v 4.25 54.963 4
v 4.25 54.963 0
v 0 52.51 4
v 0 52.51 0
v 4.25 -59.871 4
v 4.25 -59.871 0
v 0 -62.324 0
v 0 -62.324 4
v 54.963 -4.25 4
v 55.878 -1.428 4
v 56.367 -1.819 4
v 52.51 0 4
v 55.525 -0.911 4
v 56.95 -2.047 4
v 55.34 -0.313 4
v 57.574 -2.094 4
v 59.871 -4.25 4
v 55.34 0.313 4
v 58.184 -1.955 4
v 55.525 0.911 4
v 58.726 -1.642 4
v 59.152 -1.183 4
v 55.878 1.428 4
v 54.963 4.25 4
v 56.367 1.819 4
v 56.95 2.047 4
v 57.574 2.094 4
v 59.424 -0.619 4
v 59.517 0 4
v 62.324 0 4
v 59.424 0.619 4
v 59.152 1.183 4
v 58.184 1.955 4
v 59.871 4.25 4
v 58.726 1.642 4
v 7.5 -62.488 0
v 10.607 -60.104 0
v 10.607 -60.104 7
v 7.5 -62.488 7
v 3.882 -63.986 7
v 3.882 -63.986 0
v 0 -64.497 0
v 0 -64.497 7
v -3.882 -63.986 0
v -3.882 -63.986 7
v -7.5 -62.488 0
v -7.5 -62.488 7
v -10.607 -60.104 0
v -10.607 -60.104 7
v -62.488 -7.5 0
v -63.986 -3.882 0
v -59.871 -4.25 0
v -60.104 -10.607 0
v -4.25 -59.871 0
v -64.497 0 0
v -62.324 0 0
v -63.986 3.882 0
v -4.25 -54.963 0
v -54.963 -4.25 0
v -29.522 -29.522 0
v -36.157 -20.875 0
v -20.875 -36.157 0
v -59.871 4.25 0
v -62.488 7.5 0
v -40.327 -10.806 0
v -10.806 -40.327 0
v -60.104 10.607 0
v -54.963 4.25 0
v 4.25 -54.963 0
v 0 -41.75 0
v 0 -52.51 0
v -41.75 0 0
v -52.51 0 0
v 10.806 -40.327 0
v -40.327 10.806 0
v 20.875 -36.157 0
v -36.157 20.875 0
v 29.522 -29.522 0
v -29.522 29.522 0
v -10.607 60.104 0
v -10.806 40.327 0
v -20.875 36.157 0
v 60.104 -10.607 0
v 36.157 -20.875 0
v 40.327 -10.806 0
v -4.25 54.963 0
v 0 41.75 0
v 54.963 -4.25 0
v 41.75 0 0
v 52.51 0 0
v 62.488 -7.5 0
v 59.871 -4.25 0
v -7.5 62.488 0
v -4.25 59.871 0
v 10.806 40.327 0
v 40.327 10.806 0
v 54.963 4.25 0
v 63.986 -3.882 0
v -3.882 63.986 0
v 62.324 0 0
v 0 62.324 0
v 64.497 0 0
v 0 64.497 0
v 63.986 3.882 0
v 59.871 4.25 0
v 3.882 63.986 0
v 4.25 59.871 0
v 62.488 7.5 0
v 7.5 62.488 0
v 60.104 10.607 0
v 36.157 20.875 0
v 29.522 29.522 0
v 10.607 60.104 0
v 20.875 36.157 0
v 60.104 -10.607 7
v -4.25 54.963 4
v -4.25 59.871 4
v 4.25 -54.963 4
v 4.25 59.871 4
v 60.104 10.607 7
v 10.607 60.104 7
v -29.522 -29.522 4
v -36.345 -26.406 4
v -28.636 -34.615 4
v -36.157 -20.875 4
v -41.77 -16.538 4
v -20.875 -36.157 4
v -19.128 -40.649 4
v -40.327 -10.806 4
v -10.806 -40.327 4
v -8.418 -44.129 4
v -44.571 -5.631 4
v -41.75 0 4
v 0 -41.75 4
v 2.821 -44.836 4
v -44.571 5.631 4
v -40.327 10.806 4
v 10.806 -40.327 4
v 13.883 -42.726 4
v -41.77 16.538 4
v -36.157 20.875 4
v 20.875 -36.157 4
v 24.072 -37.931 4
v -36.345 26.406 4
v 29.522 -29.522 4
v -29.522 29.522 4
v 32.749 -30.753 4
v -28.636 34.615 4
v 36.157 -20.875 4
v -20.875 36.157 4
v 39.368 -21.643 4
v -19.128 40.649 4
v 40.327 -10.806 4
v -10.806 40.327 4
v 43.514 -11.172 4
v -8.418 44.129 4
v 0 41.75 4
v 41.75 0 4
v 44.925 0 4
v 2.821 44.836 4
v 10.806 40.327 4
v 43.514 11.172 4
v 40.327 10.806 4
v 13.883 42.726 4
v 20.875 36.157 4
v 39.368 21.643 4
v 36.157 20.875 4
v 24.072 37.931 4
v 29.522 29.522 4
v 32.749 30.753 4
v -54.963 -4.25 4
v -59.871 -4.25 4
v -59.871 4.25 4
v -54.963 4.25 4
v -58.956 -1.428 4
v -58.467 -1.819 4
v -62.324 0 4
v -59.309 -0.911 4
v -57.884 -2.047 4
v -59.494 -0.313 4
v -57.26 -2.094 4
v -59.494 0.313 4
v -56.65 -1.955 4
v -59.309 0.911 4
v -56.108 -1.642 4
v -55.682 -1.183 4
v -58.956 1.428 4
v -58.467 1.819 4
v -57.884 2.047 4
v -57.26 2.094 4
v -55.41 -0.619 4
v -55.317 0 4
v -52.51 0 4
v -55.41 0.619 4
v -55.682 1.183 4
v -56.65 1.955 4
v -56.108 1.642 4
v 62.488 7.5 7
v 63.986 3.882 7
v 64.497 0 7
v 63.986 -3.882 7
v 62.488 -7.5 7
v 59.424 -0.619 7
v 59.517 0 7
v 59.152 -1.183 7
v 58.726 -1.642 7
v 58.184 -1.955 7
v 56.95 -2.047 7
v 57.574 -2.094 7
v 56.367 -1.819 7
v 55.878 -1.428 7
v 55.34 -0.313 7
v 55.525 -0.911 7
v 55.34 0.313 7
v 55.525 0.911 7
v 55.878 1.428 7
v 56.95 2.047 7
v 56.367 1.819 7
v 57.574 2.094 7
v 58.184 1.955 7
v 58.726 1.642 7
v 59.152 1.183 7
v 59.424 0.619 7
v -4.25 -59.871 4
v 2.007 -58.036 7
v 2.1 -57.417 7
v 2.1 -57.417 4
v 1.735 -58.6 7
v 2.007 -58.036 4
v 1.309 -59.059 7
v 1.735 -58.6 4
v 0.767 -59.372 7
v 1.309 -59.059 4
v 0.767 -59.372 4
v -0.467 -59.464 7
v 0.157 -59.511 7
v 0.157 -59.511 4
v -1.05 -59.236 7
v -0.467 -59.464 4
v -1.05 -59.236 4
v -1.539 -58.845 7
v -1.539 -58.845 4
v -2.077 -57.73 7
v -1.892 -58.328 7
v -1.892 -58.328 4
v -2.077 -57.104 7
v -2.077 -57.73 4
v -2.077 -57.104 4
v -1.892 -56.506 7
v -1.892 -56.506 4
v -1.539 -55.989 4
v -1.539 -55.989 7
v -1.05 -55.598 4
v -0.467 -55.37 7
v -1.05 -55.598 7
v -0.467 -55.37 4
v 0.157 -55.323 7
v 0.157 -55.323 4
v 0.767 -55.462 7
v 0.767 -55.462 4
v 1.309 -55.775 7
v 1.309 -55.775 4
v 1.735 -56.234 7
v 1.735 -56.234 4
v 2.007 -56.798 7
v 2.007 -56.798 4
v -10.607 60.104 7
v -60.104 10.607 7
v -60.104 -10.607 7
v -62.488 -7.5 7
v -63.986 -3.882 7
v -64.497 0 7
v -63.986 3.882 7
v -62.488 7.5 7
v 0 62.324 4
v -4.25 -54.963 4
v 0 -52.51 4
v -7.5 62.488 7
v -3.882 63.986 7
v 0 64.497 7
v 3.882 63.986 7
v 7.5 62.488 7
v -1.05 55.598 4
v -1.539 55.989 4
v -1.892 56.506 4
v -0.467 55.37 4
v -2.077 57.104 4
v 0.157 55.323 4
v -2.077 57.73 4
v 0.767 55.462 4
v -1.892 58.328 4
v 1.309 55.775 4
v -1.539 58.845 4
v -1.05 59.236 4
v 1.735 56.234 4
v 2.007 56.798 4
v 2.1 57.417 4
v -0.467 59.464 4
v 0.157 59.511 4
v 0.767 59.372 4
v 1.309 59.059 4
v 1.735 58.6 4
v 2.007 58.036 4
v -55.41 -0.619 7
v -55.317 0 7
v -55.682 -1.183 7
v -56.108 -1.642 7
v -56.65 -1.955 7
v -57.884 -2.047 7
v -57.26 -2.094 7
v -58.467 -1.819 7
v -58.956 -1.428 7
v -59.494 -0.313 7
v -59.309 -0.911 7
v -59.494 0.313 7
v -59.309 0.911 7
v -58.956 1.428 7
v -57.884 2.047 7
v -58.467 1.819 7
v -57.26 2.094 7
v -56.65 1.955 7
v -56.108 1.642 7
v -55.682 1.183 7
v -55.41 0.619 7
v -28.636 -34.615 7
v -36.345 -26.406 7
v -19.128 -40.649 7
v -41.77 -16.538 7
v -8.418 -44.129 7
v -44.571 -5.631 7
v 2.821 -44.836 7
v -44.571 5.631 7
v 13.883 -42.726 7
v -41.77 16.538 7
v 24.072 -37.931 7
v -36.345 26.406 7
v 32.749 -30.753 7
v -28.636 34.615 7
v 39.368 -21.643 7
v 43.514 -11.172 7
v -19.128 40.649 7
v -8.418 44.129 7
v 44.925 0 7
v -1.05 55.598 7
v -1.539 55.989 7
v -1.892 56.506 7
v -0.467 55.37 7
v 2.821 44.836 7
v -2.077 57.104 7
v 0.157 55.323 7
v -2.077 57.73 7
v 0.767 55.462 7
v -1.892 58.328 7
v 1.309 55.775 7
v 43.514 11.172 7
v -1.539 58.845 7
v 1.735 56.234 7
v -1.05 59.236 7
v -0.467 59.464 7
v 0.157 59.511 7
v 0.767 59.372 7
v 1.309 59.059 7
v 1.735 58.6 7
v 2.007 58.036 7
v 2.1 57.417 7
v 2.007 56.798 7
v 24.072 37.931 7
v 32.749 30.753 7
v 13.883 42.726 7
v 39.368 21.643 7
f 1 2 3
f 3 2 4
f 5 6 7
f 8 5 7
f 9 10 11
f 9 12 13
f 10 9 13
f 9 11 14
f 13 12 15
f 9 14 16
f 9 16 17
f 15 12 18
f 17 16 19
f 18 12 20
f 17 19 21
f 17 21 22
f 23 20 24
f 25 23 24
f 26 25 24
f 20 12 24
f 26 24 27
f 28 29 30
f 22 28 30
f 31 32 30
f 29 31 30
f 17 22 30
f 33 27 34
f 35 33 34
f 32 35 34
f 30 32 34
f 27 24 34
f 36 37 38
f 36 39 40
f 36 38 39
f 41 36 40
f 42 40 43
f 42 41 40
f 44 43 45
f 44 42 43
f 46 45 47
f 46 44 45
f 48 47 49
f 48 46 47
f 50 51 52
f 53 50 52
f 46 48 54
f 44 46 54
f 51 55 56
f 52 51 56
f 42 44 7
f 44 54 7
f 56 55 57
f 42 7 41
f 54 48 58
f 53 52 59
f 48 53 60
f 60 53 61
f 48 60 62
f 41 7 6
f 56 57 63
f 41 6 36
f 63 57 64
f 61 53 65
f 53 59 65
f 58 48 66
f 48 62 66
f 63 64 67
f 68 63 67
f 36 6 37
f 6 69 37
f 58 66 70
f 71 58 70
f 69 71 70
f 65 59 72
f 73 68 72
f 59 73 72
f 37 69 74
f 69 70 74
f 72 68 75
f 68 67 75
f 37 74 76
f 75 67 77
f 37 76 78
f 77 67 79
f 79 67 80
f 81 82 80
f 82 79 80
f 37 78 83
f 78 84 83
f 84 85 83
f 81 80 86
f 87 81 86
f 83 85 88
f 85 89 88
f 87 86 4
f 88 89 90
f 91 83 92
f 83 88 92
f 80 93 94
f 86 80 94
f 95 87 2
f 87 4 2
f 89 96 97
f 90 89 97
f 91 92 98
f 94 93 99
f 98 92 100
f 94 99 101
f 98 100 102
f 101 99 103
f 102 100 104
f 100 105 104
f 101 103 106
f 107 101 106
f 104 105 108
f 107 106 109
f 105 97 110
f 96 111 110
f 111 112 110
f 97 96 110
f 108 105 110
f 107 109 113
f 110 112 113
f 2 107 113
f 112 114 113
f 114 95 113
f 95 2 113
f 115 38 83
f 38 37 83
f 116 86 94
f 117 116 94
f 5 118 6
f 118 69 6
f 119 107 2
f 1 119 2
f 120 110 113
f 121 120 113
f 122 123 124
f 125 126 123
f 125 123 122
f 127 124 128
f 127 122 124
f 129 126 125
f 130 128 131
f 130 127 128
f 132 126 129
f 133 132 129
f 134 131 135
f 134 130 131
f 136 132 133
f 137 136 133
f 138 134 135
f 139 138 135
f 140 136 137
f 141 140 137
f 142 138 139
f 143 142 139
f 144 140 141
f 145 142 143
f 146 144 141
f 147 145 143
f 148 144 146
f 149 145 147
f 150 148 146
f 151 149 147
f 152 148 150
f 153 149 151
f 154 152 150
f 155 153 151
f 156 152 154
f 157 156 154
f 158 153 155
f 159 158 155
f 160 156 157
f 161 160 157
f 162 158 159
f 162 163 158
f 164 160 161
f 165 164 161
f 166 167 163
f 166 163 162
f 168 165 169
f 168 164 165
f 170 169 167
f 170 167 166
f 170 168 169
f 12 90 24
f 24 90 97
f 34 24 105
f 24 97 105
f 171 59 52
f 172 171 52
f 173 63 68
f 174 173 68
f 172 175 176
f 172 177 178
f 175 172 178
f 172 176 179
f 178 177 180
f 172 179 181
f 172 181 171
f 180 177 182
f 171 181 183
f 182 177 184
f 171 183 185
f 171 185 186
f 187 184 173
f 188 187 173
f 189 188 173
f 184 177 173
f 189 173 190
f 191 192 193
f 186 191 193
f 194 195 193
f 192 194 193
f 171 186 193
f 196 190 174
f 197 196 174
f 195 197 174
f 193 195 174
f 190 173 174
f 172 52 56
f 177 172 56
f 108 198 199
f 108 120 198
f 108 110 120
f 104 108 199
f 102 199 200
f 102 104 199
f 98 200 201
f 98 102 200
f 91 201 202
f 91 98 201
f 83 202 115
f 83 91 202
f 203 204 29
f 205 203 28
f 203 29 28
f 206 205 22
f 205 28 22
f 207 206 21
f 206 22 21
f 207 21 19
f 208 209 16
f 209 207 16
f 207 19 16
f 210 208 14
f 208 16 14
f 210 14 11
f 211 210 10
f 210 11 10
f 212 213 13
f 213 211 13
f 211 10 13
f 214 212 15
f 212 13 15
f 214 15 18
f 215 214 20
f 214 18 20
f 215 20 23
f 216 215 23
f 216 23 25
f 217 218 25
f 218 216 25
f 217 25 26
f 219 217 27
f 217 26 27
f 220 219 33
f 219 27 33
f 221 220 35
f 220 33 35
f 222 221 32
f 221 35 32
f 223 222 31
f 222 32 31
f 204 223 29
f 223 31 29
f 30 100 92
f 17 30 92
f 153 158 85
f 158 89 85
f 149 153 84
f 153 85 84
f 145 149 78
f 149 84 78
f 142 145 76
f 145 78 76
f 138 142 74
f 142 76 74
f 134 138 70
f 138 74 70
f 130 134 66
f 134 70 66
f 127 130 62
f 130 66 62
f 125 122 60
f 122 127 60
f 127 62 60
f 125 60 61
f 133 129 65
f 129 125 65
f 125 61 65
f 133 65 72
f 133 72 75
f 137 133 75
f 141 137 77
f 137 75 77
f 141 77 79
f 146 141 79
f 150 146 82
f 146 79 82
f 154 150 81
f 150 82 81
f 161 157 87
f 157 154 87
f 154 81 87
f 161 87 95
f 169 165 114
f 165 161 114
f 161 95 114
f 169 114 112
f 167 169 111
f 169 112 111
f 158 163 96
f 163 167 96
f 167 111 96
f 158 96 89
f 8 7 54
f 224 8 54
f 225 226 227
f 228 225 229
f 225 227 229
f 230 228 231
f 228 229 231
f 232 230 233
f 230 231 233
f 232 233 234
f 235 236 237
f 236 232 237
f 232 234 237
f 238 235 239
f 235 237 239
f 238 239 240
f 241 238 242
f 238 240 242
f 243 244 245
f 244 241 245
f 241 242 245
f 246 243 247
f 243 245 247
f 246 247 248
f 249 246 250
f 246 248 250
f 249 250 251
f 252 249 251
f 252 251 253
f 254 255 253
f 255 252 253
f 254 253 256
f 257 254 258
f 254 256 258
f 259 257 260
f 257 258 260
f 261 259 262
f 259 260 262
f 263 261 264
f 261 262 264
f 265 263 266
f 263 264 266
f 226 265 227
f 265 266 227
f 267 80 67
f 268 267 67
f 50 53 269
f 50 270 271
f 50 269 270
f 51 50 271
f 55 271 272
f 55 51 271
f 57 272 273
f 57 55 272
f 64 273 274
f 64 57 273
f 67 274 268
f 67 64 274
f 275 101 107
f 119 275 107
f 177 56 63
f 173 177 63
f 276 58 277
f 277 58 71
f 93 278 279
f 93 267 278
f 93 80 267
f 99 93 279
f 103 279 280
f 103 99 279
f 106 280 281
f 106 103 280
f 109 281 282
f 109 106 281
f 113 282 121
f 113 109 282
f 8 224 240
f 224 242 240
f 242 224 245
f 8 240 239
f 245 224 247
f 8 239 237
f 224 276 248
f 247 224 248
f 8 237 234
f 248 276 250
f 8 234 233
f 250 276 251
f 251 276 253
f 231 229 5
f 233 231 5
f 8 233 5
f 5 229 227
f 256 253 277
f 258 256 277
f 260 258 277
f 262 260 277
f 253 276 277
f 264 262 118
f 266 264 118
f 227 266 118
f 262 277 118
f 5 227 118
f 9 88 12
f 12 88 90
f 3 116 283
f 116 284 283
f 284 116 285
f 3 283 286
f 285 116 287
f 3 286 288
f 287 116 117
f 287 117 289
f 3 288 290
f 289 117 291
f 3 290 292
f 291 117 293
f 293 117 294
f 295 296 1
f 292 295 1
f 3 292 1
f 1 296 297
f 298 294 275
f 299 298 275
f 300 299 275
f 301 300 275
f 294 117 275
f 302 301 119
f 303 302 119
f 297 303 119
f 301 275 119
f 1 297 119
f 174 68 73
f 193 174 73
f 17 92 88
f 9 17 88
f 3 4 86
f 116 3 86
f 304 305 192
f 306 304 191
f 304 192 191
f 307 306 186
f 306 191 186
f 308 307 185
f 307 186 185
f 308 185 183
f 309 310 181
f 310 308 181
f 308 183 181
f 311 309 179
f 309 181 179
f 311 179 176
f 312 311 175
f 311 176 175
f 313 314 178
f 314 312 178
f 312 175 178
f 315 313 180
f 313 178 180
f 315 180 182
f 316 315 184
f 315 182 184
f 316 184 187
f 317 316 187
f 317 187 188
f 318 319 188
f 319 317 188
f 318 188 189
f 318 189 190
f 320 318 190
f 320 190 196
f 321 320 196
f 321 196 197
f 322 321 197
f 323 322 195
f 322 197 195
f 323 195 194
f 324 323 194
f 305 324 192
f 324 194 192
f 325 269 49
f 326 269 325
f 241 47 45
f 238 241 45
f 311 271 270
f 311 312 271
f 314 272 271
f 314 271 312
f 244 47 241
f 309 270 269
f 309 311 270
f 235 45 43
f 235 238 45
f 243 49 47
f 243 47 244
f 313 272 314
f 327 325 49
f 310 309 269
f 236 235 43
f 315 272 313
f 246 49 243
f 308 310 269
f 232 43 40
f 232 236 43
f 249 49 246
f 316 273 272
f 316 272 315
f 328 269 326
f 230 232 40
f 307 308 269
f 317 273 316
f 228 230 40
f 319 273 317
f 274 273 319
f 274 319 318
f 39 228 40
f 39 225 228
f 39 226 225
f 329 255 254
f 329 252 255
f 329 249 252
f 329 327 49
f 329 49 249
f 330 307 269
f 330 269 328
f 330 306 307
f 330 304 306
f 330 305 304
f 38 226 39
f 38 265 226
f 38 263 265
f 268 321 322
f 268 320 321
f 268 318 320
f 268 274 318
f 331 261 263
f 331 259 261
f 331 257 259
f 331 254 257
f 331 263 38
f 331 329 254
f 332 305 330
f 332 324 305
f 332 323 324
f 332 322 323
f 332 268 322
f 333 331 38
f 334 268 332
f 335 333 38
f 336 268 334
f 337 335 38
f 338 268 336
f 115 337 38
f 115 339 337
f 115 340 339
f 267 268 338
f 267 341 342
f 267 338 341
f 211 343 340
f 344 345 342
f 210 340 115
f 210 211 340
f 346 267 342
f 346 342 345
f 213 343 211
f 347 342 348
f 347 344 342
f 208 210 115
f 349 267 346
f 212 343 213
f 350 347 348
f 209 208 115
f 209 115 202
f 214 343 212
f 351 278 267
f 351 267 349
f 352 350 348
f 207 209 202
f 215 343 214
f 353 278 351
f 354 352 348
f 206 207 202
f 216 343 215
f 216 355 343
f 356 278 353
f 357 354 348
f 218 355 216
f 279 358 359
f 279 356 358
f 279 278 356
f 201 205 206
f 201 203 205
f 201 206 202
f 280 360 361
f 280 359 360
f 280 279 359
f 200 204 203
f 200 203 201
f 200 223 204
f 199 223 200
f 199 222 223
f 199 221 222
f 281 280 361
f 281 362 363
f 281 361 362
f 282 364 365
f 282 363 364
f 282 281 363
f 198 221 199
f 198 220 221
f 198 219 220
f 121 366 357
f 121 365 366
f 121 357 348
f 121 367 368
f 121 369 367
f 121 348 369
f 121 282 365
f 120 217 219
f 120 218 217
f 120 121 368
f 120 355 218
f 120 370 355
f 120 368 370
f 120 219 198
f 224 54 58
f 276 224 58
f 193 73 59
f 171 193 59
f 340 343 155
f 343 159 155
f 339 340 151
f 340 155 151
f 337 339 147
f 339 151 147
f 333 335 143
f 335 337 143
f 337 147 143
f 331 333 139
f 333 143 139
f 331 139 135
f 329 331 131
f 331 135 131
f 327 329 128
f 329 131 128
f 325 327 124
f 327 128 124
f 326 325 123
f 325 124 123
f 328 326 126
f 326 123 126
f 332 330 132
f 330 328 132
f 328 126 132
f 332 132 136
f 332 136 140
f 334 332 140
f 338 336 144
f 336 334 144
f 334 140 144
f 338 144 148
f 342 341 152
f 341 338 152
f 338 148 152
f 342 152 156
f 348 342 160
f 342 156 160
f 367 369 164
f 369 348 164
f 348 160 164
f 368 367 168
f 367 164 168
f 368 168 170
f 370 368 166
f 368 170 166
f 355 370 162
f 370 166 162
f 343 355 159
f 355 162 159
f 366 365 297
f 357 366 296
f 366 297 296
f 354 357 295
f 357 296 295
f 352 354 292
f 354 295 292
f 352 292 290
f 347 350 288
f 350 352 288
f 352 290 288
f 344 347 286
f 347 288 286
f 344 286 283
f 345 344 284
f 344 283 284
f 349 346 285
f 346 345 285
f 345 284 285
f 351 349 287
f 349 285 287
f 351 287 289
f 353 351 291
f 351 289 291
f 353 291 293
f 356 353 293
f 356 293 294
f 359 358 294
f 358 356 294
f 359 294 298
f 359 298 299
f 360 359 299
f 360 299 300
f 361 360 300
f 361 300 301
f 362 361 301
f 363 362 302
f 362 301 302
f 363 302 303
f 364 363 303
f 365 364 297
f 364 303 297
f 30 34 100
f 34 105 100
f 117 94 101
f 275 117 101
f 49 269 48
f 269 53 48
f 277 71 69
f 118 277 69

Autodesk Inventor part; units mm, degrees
ref_plane "YZ Plane" through (0, 0, 0) normal (1, 0, 0) x (0, 1, 0)
ref_plane "XZ Plane" through (0, 0, 0) normal (0, 1, 0) x (-1, 0, 0)
ref_plane "XY Plane" through (0, 0, 0) normal (0, 0, 1) x (1, 0, 0)
sketch "Sketch1" plane through (0, 0, 0) normal (0, 0, 1) x (1, 0, 0)
  circle A0 centre (0, 0) radius 44.925
  circle A1 centre (0, 0) radius 57.417 construction
  circle A2 centre (-57.417, 0) radius 2.1
  circle A3 centre (0, -57.417) radius 2.1
  circle A4 centre (57.417, 0) radius 2.1
  circle A5 centre (0, 57.417) radius 2.1
  circle A6 centre (0, 0) radius 41.75
  line L0 (0, 62.3245) -> (4.25, 59.8707)
  line L1 (4.25, 59.8707) -> (4.25, 54.9633)
  line L2 (4.25, 54.9633) -> (0, 52.5095)
  line L3 (0, 52.5095) -> (-4.25, 54.9633)
  line L4 (-4.25, 54.9633) -> (-4.25, 59.8707)
  line L5 (-4.25, 59.8707) -> (0, 62.3245)
  line L6 (60.1041, 10.6066) -> (10.6066, 60.1041)
  line L7 (-10.6066, 60.1041) -> (-60.1041, 10.6066)
  line L8 (-60.1041, -10.6066) -> (-10.6066, -60.1041)
  line L9 (10.6066, -60.1041) -> (60.1041, -10.6066)
  arc A7 (-10.6066, -60.1041) -> (10.6066, -60.1041) centre (0, -49.4975) ccw
  arc A8 (-60.1041, 10.6066) -> (-60.1041, -10.6066) centre (-49.4975, 0) ccw
  arc A9 (10.6066, 60.1041) -> (-10.6066, 60.1041) centre (0, 49.4975) ccw
  arc A10 (60.1041, -10.6066) -> (60.1041, 10.6066) centre (49.4975, 0) ccw
  line L10 (-59.8707, -4.25) -> (-62.3245, 0)
  line L11 (-54.9633, -4.25) -> (-59.8707, -4.25)
  line L12 (-62.3245, 0) -> (-59.8707, 4.25)
  line L13 (-59.8707, 4.25) -> (-54.9633, 4.25)
  line L14 (-54.9633, 4.25) -> (-52.5095, 0)
  line L15 (-52.5095, 0) -> (-54.9633, -4.25)
  line L16 (4.25, -59.8707) -> (0, -62.3245)
  line L17 (4.25, -54.9633) -> (4.25, -59.8707)
  line L18 (0, -62.3245) -> (-4.25, -59.8707)
  line L19 (-4.25, -59.8707) -> (-4.25, -54.9633)
  line L20 (-4.25, -54.9633) -> (0, -52.5095)
  line L21 (0, -52.5095) -> (4.25, -54.9633)
  line L22 (59.8707, 4.25) -> (62.3245, 0)
  line L23 (54.9633, 4.25) -> (59.8707, 4.25)
  line L24 (62.3245, 0) -> (59.8707, -4.25)
  line L25 (59.8707, -4.25) -> (54.9633, -4.25)
  line L26 (54.9633, -4.25) -> (52.5095, 0)
  line L27 (52.5095, 0) -> (54.9633, 4.25)
  point P0 (70.7107, 0)
  point P1 (0, 70.7107)
  point P2 (-70.7107, 0)
  point P3 (0, -70.7107)
  dimension "d1" = 114.834
  dimension "d0" = 89.85
  dimension "d2" = 4.2
  dimension "d5" = 360
  dimension "d8" = 83.5
  dimension "d18" = 8.5
  dimension "d25" = 100
  dimension "d26" = 100
  dimension "d27" = 15
  dimension "d30" = 360
extrude "Extrusion1" add sketch "Sketch1" along normal blind 7 contours L0 L1 L2 L3 L4 L5 | A10 L9 A7 L8 A8 L7 A9 L6 | L10 L12 L13 L14 L15 L11 | L16 L18 L19 L20 L21 L17 | L22 L24 L25 L26 L27 L23
extrude "Extrusion2" add sketch "Sketch1" along normal blind 4 contours A0
extrude "Extrusion3" cut sketch "Sketch1" along normal blind 4 contours A2 | A3 | A4 | A5 | L0 L1 L2 L3 L4 L5 | L10 L12 L13 L14 L15 L11 | L16 L18 L19 L20 L21 L17 | L22 L24 L25 L26 L27 L23
properties part number "Fix_bearing_Base"
